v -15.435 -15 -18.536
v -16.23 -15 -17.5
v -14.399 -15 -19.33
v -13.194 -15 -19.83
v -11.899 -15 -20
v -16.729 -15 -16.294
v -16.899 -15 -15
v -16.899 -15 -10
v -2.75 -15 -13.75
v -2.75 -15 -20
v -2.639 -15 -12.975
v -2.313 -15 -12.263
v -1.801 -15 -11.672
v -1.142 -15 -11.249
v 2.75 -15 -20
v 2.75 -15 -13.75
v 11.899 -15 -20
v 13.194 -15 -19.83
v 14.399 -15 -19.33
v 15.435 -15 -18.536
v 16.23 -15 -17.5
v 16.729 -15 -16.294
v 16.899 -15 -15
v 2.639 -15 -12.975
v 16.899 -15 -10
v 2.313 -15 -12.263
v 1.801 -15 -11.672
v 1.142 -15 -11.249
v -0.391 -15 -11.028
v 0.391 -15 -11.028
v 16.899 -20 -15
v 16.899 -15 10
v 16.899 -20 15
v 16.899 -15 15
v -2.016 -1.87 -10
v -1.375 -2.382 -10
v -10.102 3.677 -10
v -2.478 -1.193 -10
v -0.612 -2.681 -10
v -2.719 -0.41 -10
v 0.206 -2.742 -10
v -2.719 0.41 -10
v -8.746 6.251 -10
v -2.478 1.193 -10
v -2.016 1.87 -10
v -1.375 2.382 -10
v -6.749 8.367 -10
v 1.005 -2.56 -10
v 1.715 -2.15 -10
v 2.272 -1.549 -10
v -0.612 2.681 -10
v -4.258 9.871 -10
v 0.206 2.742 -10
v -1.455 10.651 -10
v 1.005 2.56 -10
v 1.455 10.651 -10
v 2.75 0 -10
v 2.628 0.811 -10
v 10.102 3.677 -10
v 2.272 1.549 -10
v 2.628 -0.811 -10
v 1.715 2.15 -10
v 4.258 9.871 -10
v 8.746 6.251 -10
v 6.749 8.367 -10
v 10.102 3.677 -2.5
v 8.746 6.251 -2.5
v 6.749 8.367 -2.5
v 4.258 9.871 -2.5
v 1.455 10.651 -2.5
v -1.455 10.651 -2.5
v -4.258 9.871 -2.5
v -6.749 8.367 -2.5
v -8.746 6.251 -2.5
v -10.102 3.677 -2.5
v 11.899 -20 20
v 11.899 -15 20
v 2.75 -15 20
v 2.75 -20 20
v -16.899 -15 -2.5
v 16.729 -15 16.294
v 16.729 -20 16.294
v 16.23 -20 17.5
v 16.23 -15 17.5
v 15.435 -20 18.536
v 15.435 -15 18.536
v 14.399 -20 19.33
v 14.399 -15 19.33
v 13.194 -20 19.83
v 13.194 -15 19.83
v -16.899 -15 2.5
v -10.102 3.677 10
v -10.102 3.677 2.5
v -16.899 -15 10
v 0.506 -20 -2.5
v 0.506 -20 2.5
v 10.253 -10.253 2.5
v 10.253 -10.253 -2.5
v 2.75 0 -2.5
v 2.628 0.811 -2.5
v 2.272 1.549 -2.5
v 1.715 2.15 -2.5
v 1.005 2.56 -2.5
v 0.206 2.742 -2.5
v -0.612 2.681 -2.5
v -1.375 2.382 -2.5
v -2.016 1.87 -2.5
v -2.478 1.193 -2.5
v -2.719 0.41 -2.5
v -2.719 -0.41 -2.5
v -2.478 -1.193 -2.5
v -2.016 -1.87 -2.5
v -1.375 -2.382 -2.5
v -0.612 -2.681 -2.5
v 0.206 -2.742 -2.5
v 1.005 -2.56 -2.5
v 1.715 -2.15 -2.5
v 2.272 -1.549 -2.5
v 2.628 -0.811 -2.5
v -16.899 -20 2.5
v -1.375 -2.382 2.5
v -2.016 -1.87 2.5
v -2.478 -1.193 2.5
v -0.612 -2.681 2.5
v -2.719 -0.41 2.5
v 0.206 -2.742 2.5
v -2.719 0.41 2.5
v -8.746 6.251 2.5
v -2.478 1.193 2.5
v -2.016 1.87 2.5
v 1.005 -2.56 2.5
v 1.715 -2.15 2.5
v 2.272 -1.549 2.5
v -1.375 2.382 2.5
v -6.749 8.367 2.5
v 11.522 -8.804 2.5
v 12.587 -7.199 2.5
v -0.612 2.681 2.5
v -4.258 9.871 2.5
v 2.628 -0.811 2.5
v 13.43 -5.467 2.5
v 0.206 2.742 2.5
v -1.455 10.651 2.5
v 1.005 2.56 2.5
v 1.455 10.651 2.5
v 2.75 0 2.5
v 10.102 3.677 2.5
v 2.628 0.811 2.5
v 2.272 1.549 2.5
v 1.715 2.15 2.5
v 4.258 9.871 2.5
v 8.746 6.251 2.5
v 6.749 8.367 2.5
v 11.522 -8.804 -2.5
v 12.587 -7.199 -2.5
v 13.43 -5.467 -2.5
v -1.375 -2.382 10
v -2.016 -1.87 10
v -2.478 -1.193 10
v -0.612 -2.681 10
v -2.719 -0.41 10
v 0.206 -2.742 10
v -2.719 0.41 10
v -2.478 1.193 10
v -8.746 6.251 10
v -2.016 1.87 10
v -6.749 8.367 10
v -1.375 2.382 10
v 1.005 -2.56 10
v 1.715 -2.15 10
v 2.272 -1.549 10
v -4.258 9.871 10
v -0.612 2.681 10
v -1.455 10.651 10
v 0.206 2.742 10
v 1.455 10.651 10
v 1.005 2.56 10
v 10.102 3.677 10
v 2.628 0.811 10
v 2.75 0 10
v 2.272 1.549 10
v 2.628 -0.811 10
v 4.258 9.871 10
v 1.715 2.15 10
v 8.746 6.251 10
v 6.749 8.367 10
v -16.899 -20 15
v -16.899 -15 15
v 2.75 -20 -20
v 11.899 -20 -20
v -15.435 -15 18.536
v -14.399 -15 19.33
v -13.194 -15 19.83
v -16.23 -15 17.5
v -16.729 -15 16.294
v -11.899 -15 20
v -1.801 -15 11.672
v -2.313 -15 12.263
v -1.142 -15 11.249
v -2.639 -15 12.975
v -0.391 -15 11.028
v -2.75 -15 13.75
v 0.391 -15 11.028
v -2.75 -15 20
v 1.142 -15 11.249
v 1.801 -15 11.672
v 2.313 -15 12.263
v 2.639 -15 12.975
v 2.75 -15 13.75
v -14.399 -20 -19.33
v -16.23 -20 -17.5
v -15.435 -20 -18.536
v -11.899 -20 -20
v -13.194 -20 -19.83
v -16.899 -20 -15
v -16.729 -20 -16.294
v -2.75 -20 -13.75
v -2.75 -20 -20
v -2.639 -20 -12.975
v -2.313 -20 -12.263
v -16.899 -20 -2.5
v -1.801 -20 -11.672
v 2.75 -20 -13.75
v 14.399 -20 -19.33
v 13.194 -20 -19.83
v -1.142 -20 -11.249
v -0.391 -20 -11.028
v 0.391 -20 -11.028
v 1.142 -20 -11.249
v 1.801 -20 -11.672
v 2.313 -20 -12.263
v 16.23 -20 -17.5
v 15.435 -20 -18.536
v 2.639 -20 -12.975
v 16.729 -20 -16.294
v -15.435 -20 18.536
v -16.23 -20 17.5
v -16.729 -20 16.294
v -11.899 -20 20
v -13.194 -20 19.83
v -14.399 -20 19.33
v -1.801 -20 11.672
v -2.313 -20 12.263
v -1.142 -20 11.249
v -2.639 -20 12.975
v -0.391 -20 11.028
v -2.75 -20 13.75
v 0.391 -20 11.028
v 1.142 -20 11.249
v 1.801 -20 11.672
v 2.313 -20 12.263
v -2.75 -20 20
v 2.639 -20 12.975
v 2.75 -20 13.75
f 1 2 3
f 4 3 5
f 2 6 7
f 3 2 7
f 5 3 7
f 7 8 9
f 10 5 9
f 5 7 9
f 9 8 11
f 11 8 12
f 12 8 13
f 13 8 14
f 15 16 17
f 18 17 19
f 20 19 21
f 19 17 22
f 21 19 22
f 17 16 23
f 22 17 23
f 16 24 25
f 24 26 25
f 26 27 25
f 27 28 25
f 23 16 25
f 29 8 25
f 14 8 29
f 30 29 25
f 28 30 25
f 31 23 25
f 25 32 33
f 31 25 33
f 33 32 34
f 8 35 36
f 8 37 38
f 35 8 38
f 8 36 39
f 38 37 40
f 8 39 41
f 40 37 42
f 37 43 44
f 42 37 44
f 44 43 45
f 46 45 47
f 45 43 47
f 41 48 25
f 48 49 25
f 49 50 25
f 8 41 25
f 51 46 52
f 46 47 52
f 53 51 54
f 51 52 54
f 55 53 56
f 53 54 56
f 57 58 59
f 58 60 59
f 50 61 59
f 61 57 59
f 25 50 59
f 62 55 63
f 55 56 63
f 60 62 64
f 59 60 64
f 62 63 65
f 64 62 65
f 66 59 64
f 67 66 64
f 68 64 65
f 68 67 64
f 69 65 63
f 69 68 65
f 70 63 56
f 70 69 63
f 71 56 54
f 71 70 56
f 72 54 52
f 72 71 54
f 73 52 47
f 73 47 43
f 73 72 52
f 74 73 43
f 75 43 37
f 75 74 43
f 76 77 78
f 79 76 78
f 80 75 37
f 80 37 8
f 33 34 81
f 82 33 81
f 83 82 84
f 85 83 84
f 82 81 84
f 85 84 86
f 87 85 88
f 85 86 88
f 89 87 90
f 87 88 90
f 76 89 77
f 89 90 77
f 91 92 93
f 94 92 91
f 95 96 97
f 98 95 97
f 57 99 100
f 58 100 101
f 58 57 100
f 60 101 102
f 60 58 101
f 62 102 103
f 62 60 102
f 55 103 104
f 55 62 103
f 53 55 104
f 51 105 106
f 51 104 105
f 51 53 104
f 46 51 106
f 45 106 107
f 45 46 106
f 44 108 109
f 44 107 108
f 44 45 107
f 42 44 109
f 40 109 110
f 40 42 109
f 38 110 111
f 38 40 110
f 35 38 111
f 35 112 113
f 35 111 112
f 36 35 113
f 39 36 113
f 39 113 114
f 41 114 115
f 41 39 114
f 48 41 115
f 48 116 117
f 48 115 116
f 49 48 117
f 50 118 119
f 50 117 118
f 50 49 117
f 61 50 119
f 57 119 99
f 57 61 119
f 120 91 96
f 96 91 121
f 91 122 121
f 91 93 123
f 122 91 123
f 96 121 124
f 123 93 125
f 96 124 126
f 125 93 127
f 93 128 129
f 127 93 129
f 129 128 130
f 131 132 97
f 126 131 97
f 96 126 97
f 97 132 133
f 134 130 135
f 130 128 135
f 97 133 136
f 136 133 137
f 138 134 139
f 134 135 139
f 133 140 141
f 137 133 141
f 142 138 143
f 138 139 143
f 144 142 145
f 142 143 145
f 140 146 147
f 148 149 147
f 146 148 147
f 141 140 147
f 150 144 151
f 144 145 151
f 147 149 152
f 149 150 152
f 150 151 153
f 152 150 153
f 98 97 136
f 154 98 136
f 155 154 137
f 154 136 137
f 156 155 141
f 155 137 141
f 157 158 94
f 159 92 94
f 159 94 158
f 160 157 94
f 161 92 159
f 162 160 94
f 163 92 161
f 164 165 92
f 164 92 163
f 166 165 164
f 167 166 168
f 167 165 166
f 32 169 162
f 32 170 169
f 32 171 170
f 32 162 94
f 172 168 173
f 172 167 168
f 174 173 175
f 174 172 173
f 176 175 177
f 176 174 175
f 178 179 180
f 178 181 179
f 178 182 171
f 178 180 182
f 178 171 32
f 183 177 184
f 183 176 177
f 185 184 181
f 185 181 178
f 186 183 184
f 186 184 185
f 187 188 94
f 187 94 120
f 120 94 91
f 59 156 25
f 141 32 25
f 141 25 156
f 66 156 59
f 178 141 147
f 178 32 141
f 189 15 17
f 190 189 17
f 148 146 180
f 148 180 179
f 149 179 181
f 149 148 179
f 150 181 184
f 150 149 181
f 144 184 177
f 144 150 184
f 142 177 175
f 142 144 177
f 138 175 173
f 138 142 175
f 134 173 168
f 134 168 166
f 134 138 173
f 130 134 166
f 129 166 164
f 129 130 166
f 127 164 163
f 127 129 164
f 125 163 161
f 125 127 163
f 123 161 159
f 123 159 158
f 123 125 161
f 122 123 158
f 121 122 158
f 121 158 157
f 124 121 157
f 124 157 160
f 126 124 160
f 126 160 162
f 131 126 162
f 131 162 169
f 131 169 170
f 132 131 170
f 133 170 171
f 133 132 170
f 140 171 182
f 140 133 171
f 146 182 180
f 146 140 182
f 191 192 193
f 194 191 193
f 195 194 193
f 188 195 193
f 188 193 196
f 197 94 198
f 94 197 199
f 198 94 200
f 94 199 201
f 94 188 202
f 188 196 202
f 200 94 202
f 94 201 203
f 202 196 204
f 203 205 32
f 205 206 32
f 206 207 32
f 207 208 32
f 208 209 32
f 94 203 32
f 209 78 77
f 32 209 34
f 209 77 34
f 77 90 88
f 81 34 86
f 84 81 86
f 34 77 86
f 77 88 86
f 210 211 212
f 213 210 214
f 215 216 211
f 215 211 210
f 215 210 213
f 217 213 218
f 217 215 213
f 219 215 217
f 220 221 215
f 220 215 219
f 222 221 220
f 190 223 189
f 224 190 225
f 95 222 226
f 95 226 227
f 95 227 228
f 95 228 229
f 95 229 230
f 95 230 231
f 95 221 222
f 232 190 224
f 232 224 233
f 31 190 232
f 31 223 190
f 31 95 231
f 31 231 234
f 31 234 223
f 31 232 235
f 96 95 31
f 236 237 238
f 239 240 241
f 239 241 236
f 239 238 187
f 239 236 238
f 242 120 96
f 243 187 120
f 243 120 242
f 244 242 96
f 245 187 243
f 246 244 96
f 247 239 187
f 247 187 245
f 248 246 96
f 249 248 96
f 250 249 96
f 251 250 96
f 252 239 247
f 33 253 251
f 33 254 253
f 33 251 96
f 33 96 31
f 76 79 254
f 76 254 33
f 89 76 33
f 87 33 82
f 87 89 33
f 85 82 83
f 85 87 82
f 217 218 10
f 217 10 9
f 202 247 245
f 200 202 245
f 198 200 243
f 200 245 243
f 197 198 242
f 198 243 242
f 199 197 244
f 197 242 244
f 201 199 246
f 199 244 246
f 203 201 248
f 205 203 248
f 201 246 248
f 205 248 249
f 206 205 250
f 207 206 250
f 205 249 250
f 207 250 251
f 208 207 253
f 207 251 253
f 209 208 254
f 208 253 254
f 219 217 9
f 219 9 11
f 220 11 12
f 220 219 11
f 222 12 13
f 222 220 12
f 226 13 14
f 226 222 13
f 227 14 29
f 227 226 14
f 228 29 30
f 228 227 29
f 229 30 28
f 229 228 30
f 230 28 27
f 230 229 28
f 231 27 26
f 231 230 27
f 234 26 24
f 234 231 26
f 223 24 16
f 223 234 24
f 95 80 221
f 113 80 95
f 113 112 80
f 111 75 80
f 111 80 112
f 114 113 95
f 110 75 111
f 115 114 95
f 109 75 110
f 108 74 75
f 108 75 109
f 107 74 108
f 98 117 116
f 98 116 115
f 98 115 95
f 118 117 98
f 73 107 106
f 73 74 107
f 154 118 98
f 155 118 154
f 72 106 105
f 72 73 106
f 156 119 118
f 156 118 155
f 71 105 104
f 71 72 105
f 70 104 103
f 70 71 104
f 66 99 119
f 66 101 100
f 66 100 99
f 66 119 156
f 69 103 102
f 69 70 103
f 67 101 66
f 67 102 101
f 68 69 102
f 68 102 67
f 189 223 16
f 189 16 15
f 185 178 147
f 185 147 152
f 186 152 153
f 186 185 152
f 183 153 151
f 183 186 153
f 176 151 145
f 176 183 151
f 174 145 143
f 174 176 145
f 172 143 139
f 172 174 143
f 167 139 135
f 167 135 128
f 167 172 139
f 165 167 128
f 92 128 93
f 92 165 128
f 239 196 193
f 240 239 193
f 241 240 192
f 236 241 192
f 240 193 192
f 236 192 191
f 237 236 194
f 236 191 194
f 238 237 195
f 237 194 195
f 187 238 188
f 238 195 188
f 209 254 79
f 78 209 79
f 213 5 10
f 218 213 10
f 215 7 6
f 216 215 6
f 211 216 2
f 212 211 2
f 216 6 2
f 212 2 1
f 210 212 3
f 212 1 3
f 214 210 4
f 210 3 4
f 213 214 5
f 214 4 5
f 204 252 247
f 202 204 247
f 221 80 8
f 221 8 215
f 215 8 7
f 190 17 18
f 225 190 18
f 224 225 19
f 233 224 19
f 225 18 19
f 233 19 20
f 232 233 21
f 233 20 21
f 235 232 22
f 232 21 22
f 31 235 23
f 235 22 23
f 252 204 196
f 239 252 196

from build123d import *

# Parameters (mm, degrees)
SKETCH1_R           = 2.75
BOSS_EXTRUDE1_DEPTH = 10
SKETCH2_R           = 14.5
CUT_EXTRUDE1_DEPTH  = 2.5
BOSS_EXTRUDE2_DEPTH = 5
CUT_EXTRUDE5_DEPTH  = 41.387552571
SKETCH5_R           = 14.5
CUT_EXTRUDE6_DEPTH  = 2.5


with BuildPart() as part:
    # Sketch1 → Boss-Extrude1 (new, symmetric)
    with BuildSketch(Plane.XY):
        with BuildLine():
            Line((-10.101695673, 3.676716541), (-16.899464568, -15))
            Line((-16.899464568, -15), (16.899464568, -15))
            Line((16.899464568, -15), (10.101695673, 3.676716541))
            ThreePointArc((10.101695673, 3.676716541), (0, 10.75), (-10.101695673, 3.676716541))
        make_face()
        Circle(SKETCH1_R, mode=Mode.SUBTRACT)
    extrude(amount=BOSS_EXTRUDE1_DEPTH, both=True)

    # Sketch2 → Cut-Extrude1 (cut, symmetric)
    with BuildSketch(Plane.XY):
        Circle(SKETCH2_R)
    extrude(amount=CUT_EXTRUDE1_DEPTH, both=True, mode=Mode.SUBTRACT)

    # Sketch3 → Boss-Extrude2 (add)
    with BuildSketch(Plane.XZ.offset(15)):
        with BuildLine():
            Line((-16.899464568, 15), (-16.899464568, 10))
            Line((-16.899464568, 10), (16.899464568, 10))
            Line((16.899464568, 10), (16.899464568, 15))
            ThreePointArc((16.899464568, 15), (15.434998474, 18.535533906), (11.899464568, 20))
            Line((11.899464568, 20), (-11.899464568, 20))
            ThreePointArc((-11.899464568, 20), (-15.434998474, 18.535533906), (-16.899464568, 15))
        make_face()
        Polygon((16.899464568, 10), (-16.899464568, 10), (-16.899464568, -10), (16.899464568, -10), (16.899464568, 0), align=None)
        with BuildLine():
            Line((16.899464568, -10), (-16.899464568, -10))
            Line((-16.899464568, -10), (-16.899464568, -15))
            ThreePointArc((-16.899464568, -15), (-15.434998474, -18.535533906), (-11.899464568, -20))
            Line((-11.899464568, -20), (11.899464568, -20))
            ThreePointArc((11.899464568, -20), (15.434998474, -18.535533906), (16.899464568, -15))
            Line((16.899464568, -15), (16.899464568, -10))
        make_face()
    extrude(amount=BOSS_EXTRUDE2_DEPTH)

    # Sketch4 → Cut-Extrude5 (cut, through all)
    with BuildSketch(Plane.XZ.offset(20)):
        with BuildLine():
            Line((-2.75, 20), (-2.75, 13.75))
            ThreePointArc((-2.75, 13.75), (0, 11), (2.75, 13.75))
            Line((2.75, 13.75), (2.75, 20))
            Line((2.75, 20), (-2.75, 20))
        make_face()
        with BuildLine():
            Line((-2.75, -20), (-2.75, -13.75))
            ThreePointArc((-2.75, -13.75), (0, -11), (2.75, -13.75))
            Line((2.75, -13.75), (2.75, -20))
            Line((2.75, -20), (-2.75, -20))
        make_face()
    extrude(amount=-CUT_EXTRUDE5_DEPTH, mode=Mode.SUBTRACT)

    # Sketch5 → Cut-Extrude6 (cut, symmetric)
    with BuildSketch(Plane.XY):
        Circle(SKETCH5_R)
        with BuildLine():
            ThreePointArc((10.253048327, -10.253048327), (-10.253048327, -10.253048327), (-10.253048327, 10.253048327))
            Line((-10.253048327, 10.253048327), (-31.466251763, -10.960155108))
            Line((-31.466251763, -10.960155108), (-10.960155108, -31.466251763))
            Line((-10.960155108, -31.466251763), (10.253048327, -10.253048327))
        make_face()
    extrude(amount=CUT_EXTRUDE6_DEPTH, both=True, mode=Mode.SUBTRACT)


solid = part.part
